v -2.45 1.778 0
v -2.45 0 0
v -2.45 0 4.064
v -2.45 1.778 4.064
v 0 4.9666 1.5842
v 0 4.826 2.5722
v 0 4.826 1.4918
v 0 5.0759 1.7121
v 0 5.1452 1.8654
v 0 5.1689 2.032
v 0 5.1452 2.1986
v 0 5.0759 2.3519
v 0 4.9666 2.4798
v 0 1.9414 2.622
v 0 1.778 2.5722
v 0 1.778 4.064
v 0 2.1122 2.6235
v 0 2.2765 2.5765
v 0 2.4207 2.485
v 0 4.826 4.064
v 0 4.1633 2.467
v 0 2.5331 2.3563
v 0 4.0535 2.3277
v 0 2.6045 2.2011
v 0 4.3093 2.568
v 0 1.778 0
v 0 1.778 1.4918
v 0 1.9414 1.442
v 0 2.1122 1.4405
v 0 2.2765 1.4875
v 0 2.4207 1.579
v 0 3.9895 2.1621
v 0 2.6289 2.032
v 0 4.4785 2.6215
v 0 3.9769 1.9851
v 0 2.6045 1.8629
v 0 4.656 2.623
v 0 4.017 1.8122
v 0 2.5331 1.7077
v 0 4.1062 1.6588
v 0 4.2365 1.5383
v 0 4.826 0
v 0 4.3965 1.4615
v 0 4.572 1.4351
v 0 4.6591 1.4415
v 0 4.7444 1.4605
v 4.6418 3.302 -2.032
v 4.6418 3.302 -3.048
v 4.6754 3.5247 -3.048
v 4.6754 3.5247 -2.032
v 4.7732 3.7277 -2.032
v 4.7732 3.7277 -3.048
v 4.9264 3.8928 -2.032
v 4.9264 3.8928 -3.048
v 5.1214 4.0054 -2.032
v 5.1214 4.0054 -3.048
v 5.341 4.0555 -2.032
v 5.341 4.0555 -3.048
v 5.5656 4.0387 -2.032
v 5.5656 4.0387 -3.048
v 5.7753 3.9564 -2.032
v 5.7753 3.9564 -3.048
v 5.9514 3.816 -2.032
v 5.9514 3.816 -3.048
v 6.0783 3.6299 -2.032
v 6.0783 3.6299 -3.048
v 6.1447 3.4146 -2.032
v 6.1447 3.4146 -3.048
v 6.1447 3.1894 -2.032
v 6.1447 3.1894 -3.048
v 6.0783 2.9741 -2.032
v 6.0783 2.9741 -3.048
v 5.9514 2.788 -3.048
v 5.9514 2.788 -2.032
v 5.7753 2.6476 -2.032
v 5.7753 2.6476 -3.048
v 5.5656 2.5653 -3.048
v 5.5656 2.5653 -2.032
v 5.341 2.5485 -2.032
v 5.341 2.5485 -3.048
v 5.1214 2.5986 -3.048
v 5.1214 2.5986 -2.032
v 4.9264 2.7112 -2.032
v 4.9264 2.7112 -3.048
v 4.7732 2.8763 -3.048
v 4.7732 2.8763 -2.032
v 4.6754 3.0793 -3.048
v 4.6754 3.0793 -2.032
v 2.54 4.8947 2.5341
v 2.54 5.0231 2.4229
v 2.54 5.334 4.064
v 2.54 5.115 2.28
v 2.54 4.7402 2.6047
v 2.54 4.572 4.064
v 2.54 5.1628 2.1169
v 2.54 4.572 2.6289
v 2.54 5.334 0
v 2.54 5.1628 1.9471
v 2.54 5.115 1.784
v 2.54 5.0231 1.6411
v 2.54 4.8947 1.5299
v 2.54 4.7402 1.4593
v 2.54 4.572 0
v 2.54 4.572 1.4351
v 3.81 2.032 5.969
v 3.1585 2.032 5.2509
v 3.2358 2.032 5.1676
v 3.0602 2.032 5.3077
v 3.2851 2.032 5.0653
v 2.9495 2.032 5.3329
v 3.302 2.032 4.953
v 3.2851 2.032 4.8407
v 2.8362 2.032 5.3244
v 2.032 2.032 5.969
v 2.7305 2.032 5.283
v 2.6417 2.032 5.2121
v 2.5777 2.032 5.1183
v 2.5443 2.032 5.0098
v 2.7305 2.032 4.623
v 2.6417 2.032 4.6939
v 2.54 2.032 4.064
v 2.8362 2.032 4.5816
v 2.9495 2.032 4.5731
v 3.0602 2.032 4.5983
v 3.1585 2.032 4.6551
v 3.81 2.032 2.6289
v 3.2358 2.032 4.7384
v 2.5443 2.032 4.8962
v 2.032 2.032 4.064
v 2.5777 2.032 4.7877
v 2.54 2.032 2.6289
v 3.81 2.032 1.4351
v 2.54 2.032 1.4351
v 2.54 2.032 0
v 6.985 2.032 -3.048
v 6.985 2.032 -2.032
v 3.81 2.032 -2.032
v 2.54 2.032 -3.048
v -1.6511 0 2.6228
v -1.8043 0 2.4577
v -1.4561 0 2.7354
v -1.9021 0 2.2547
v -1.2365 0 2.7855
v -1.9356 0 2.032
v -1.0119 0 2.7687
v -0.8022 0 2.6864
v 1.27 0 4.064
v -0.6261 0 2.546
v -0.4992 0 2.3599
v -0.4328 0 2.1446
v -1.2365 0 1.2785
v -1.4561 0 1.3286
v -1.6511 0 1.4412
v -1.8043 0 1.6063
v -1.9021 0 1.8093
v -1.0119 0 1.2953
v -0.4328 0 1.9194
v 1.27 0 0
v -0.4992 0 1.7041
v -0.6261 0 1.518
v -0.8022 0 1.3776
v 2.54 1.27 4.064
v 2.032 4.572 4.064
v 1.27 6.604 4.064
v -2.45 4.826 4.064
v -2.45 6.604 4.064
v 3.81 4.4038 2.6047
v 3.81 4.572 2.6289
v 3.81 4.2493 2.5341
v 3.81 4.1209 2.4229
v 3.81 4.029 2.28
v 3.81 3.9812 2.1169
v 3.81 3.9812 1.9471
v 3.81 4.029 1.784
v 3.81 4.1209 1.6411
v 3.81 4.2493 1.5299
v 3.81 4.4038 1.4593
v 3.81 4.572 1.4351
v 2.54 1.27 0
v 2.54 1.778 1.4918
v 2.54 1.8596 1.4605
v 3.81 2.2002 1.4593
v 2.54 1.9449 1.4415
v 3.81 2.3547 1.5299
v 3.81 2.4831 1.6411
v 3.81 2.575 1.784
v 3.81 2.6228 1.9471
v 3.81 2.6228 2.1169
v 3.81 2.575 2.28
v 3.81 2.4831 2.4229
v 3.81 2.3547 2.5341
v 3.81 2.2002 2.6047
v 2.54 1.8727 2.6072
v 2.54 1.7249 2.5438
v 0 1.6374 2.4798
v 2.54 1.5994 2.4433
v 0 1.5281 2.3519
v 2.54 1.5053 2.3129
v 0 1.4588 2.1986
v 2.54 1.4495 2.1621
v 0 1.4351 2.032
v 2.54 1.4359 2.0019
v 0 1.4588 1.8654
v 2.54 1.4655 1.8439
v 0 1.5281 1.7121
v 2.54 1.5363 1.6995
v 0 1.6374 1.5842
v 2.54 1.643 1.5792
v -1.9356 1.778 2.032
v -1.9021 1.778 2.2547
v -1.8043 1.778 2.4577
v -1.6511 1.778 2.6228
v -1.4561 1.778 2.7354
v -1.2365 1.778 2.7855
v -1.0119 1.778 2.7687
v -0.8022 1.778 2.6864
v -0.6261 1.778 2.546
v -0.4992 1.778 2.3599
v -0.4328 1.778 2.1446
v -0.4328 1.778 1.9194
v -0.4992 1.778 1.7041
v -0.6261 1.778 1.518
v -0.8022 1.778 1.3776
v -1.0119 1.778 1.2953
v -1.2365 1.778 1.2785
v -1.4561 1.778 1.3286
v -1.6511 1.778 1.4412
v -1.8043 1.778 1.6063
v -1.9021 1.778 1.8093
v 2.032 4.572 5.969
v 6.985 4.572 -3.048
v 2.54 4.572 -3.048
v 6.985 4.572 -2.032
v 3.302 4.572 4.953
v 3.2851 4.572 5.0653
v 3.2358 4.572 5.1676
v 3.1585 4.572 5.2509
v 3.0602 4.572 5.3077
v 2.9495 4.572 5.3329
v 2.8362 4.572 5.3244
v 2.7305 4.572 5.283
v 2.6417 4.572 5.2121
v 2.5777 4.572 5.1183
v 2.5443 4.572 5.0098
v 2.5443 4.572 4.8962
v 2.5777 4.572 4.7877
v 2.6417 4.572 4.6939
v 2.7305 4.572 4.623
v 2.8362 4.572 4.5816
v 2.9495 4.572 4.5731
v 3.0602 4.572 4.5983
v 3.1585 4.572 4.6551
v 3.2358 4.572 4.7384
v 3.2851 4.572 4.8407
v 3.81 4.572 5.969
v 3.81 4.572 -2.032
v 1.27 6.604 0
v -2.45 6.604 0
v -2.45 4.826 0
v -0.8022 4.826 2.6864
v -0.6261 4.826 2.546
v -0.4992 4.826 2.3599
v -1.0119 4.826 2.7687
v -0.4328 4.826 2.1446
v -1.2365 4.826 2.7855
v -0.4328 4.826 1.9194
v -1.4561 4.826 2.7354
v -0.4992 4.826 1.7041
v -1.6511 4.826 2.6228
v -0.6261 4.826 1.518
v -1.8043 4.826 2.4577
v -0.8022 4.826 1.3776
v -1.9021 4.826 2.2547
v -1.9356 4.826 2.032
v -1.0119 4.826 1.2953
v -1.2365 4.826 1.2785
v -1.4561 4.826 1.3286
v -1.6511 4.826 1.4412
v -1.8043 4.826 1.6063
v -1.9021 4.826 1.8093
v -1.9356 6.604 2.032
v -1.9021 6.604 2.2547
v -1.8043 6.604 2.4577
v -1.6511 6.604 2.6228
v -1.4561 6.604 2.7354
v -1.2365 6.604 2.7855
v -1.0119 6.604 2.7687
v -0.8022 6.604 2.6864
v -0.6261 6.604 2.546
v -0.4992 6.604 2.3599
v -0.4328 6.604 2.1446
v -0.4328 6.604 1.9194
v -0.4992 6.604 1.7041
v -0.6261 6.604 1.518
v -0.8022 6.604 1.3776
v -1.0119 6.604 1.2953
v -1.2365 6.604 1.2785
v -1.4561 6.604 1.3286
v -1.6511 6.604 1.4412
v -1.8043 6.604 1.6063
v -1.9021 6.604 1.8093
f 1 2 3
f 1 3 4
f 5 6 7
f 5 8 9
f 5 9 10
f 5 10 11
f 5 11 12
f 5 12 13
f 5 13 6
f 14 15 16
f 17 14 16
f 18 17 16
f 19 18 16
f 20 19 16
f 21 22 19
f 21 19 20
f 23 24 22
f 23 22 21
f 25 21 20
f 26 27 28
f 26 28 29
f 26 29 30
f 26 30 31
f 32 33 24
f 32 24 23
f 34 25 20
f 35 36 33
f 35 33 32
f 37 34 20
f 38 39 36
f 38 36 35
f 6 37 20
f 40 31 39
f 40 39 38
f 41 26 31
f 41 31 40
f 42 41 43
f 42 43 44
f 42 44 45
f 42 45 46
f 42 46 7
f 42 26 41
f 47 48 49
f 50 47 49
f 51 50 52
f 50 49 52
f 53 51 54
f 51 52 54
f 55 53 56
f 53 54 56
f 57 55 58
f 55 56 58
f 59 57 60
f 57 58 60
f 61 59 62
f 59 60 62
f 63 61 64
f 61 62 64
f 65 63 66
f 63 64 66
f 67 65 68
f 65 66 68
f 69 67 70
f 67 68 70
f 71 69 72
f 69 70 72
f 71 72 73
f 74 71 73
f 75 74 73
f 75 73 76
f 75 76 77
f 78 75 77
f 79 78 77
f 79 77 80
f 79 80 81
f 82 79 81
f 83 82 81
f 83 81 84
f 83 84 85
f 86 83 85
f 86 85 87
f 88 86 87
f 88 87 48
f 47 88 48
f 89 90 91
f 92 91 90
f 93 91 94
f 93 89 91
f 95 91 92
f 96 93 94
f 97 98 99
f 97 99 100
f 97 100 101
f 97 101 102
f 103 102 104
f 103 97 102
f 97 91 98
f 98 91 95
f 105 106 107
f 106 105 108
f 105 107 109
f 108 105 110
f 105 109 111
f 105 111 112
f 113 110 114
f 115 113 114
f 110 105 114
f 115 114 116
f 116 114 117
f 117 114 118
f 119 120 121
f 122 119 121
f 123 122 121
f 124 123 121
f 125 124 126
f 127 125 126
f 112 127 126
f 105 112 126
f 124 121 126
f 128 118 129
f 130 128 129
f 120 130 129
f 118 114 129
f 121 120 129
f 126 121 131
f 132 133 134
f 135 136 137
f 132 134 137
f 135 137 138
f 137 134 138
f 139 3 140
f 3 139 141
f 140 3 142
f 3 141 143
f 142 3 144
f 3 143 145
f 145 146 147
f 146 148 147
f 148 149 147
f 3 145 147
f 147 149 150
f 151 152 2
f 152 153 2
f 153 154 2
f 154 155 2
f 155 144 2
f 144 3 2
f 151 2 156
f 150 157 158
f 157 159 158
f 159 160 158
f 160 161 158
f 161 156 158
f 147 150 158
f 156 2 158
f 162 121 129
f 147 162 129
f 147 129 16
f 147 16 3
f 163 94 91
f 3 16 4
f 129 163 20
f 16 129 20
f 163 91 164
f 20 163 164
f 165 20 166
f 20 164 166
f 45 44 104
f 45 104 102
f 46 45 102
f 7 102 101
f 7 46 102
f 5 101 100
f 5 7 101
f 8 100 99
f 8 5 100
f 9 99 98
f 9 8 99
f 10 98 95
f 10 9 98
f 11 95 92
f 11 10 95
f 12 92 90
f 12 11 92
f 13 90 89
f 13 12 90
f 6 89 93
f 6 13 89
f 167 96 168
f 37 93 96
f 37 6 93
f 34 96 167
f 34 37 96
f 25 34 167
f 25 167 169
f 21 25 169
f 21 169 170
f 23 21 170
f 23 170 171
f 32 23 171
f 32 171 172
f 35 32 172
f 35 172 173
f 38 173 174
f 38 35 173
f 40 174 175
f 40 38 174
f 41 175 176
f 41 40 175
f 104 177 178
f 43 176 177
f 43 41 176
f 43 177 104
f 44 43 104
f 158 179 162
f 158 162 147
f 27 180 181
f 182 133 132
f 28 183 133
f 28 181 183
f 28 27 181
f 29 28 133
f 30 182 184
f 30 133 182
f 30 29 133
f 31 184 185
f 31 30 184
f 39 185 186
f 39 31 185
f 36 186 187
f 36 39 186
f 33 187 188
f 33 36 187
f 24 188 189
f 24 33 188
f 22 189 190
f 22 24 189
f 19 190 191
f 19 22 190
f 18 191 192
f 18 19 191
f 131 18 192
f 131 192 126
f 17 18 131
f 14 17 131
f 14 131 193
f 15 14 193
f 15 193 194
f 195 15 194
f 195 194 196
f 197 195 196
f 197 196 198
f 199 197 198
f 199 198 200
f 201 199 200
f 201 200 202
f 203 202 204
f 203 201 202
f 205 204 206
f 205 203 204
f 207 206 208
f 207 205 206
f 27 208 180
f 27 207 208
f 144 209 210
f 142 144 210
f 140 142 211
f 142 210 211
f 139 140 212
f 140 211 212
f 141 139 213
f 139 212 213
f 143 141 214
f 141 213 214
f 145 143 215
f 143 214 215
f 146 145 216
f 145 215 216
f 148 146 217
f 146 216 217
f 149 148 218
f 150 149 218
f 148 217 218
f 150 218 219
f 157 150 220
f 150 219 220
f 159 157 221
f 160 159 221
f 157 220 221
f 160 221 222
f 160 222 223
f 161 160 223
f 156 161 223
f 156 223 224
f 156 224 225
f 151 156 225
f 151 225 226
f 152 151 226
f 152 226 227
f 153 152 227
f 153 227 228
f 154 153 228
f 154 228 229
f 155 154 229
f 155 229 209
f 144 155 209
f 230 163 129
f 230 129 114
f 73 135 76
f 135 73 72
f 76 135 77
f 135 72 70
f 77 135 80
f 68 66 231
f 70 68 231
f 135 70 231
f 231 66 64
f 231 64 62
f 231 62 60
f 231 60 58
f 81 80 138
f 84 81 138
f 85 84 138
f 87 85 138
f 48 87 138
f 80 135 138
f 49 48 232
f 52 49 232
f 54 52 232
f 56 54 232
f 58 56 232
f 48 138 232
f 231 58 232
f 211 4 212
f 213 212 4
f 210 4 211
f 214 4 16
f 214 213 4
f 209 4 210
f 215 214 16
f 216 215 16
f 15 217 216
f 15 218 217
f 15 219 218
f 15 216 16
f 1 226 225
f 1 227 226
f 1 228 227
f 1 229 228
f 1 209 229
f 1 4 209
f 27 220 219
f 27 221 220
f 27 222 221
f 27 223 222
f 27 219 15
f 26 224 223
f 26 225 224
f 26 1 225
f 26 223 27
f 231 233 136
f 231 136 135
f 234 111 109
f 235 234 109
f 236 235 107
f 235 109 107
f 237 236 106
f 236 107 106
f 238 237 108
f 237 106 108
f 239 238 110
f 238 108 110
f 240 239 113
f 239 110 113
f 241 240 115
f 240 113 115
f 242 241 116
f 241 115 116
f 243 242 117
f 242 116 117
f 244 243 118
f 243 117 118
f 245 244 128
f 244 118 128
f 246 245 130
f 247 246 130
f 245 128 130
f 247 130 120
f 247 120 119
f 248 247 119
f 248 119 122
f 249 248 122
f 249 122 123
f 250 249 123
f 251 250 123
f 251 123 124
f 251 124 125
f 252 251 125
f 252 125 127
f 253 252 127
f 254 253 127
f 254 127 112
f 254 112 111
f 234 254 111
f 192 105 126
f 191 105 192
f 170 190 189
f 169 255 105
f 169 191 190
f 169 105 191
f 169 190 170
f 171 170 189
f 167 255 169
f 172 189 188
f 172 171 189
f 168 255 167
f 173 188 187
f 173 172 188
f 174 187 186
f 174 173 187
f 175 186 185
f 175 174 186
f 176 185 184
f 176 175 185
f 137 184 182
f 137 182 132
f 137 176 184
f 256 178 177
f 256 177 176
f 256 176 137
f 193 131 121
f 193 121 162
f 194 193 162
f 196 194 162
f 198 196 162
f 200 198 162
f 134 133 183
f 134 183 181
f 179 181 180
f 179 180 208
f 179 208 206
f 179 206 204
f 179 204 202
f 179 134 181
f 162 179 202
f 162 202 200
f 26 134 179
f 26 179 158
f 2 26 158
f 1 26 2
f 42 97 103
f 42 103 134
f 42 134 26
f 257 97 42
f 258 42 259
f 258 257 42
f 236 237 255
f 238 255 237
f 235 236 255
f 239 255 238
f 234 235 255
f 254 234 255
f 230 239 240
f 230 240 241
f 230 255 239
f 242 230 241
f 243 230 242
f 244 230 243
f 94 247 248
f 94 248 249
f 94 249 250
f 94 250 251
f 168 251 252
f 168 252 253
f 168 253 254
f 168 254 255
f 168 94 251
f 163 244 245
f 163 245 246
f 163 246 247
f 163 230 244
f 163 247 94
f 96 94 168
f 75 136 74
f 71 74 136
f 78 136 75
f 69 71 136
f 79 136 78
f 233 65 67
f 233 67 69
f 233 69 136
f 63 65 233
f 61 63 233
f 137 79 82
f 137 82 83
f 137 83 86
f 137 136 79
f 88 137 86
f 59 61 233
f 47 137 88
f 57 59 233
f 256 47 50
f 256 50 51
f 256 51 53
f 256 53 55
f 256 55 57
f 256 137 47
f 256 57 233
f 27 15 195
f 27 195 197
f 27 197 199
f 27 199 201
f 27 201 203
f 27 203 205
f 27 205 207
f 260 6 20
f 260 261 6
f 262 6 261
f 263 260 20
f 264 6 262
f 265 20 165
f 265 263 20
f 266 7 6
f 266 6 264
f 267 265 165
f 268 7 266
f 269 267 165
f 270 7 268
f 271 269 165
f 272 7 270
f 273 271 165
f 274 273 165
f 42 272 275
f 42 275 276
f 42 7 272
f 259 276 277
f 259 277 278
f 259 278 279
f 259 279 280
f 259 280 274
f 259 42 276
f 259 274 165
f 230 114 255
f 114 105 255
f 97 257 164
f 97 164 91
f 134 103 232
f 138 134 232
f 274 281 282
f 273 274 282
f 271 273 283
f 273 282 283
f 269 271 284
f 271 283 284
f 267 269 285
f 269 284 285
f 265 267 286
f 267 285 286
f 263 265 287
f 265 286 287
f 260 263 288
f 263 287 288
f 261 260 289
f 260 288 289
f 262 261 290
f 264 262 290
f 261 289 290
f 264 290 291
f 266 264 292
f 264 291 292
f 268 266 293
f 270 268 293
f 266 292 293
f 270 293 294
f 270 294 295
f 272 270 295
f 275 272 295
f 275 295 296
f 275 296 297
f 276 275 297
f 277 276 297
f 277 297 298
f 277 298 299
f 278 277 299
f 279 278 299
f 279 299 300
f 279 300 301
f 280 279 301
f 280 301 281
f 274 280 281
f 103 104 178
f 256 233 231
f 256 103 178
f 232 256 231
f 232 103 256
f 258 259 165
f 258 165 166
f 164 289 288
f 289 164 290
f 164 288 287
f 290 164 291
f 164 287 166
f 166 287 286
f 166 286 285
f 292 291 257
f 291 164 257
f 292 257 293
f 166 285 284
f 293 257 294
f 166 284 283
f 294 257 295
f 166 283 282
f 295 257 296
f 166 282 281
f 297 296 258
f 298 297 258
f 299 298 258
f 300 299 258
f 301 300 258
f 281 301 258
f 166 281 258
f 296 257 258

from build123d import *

# Parameters (mm, degrees)
BOSS_EXTRUDE1_DEPTH     = 4.064
SKETCH14_W              = 9.017
SKETCH14_H              = 2.54
BOSS_EXTRUDE5_DEPTH     = 1.27
SKETCH15_W              = 1.905
SKETCH15_H              = 2.54
BOSS_EXTRUDE6_DEPTH     = 0.508
SKETCH16_W              = 1.016
SKETCH16_H              = 2.54
BOSS_EXTRUDE7_DEPTH     = 3.175
SKETCH17_R              = 0.75565
CUT_EXTRUDE6_DEPTH      = 3.175
SKETCH18_R              = 0.381
CUT_EXTRUDE7_DEPTH      = 3.175
CUT_EXTRUDE9_DEPTH      = 11.204992749
CUT_EXTRUDE9_DEPTH_BACK = 2.54
SKETCH19_R              = 0.5969
SKETCH20_R              = 0.75565
CUT_EXTRUDE10_DEPTH     = 10


with BuildPart() as part:
    # Sketch1 → Boss-Extrude1 (new body)
    with BuildSketch(Plane.XY):
        Polygon((0, 0), (-2.45, 0), (-2.45, 1.778), (0, 1.778), (0, 4.826), (-2.45, 4.826), (-2.45, 6.604), (0, 6.604), (1.27, 6.604), (2.54, 5.334), (2.54, 1.27), (1.27, 0), align=None)
    extrude(amount=BOSS_EXTRUDE1_DEPTH)

    # Sketch14 → Boss-Extrude5 (add)
    with BuildSketch(Plane(origin=(2.54, 0, 0), x_dir=(0, 0, -1), z_dir=(1, 0, 0))):
        with Locations((-1.4605, 3.302)):
            Rectangle(SKETCH14_W, SKETCH14_H)
    extrude(amount=BOSS_EXTRUDE5_DEPTH)

    # Sketch15 → Boss-Extrude6 (add)
    with BuildSketch(Plane.ZY.offset(-2.54)):
        with Locations((5.0165, 3.302)):
            Rectangle(SKETCH15_W, SKETCH15_H)
    extrude(amount=BOSS_EXTRUDE6_DEPTH)

    # Sketch16 → Boss-Extrude7 (add)
    with BuildSketch(Plane(origin=(3.81, 0, 0), x_dir=(0, 0, -1), z_dir=(1, 0, 0))):
        with Locations((2.54, 3.302)):
            Rectangle(SKETCH16_W, SKETCH16_H)
    extrude(amount=BOSS_EXTRUDE7_DEPTH)

    # Sketch17 → Cut-Extrude6 (cut)
    with BuildSketch(Plane(origin=(0, 0, -3.048), x_dir=(-1, 0, 0), z_dir=(0, 0, -1))):
        with Locations((-5.3975, 3.302)):
            Circle(SKETCH17_R)
    extrude(amount=-CUT_EXTRUDE6_DEPTH, mode=Mode.SUBTRACT)

    # Sketch18 → Cut-Extrude7 (cut)
    with BuildSketch(Plane.XZ.offset(-2.032)):
        with Locations((2.921, 4.953)):
            Circle(SKETCH18_R)
    extrude(amount=-CUT_EXTRUDE7_DEPTH, mode=Mode.SUBTRACT)

    # Sketch19 → Cut-Extrude9 (cut, two sides: drawn at the far end of the back side and taken through both)
    with BuildSketch(Plane(origin=(2.54, 0, 0), x_dir=(0, 0, -1), z_dir=(1, 0, 0)).offset(-CUT_EXTRUDE9_DEPTH_BACK)):
        with Locations((-2.032, 4.572)):
            Circle(SKETCH19_R)
        with Locations(Location((-2.032, 2.032, 0), (0, 0, 334.815663466))):
            Circle(SKETCH19_R)
    extrude(amount=CUT_EXTRUDE9_DEPTH + CUT_EXTRUDE9_DEPTH_BACK, mode=Mode.SUBTRACT)

    # Sketch20 → Cut-Extrude10 (cut)
    with BuildSketch(Plane(origin=(0, 6.604, 0), x_dir=(1, 0, 0), z_dir=(0, 1, 0))):
        with Locations(Location((-1.18, -2.032, 0), (0, 0, 180))):
            Circle(SKETCH20_R)
    extrude(amount=-CUT_EXTRUDE10_DEPTH, mode=Mode.SUBTRACT)


solid = part.part
